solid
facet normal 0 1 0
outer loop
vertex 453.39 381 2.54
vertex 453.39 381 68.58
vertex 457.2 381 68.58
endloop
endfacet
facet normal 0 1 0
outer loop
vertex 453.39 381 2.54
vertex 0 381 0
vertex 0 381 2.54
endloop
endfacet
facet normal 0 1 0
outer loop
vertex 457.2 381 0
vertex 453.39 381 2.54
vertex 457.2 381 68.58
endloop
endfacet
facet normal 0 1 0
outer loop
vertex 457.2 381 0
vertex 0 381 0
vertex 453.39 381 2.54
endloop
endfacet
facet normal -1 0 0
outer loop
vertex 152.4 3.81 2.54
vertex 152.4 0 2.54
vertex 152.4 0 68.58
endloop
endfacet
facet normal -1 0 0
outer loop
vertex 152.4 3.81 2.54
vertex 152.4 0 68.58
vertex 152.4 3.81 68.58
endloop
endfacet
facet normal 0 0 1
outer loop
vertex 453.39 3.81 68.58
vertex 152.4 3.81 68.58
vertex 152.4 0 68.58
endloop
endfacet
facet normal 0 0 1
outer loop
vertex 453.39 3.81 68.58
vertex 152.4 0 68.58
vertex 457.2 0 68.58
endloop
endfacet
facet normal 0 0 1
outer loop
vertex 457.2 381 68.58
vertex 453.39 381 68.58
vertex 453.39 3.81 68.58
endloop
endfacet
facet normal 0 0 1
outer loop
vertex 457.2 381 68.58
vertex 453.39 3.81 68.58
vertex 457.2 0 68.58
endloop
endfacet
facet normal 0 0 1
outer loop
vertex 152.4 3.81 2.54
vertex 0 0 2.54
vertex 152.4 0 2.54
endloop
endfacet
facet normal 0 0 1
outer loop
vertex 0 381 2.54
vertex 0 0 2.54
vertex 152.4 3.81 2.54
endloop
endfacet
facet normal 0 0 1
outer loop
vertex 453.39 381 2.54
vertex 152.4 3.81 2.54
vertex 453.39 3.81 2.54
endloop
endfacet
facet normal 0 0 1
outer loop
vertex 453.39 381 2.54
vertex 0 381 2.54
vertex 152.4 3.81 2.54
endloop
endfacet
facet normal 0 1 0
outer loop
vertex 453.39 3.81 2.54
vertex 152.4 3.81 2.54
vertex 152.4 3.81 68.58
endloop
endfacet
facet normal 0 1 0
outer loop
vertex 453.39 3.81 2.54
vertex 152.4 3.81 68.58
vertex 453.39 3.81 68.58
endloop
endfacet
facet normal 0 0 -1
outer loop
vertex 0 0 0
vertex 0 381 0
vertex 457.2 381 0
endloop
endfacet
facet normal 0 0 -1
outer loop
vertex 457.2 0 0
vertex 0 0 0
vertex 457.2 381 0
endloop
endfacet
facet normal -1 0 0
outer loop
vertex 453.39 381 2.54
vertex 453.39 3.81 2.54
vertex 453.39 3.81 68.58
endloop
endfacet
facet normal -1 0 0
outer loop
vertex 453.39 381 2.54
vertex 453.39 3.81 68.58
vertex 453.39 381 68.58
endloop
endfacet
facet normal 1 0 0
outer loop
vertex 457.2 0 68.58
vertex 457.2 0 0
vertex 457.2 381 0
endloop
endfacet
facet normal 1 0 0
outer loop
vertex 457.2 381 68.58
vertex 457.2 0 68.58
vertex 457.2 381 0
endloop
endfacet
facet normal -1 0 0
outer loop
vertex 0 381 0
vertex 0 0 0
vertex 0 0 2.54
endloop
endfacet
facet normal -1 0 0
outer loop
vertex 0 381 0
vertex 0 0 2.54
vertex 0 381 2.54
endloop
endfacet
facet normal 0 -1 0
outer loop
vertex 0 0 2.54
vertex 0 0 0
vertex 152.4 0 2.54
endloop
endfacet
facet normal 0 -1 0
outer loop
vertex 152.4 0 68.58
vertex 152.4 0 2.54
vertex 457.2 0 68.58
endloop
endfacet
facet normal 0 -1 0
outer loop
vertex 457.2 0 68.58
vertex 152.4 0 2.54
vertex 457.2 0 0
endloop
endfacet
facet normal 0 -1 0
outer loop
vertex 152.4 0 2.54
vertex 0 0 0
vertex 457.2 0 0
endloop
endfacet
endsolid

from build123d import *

# Parameters (mm, degrees)
F0_W     = 457.2
F0_H     = 381
F1_DEPTH = 2.54
F2_W     = 304.8
F2_H     = 3.81
F3_DEPTH = 68.58
F4_W     = 3.81
F4_H     = 377.19
F5_DEPTH = 66.04


with BuildPart() as f1:
    # F0 (on Top) → F1 (new body)
    with BuildSketch(Plane.XY):
        with Locations((228.6, 190.5)):
            Rectangle(F0_W, F0_H)
    extrude(amount=F1_DEPTH)

    # F2 (on Top) → F3 (join)
    with BuildSketch(Plane.XY):
        with Locations((304.8, 1.905)):
            Rectangle(F2_W, F2_H)
    extrude(amount=F3_DEPTH)

    # F4 (on face) → F5 (join)
    with BuildSketch(Plane.XY.offset(2.54)):
        with Locations((455.295, 192.405)):
            Rectangle(F4_W, F4_H)
    extrude(amount=F5_DEPTH)


solid = f1.part
